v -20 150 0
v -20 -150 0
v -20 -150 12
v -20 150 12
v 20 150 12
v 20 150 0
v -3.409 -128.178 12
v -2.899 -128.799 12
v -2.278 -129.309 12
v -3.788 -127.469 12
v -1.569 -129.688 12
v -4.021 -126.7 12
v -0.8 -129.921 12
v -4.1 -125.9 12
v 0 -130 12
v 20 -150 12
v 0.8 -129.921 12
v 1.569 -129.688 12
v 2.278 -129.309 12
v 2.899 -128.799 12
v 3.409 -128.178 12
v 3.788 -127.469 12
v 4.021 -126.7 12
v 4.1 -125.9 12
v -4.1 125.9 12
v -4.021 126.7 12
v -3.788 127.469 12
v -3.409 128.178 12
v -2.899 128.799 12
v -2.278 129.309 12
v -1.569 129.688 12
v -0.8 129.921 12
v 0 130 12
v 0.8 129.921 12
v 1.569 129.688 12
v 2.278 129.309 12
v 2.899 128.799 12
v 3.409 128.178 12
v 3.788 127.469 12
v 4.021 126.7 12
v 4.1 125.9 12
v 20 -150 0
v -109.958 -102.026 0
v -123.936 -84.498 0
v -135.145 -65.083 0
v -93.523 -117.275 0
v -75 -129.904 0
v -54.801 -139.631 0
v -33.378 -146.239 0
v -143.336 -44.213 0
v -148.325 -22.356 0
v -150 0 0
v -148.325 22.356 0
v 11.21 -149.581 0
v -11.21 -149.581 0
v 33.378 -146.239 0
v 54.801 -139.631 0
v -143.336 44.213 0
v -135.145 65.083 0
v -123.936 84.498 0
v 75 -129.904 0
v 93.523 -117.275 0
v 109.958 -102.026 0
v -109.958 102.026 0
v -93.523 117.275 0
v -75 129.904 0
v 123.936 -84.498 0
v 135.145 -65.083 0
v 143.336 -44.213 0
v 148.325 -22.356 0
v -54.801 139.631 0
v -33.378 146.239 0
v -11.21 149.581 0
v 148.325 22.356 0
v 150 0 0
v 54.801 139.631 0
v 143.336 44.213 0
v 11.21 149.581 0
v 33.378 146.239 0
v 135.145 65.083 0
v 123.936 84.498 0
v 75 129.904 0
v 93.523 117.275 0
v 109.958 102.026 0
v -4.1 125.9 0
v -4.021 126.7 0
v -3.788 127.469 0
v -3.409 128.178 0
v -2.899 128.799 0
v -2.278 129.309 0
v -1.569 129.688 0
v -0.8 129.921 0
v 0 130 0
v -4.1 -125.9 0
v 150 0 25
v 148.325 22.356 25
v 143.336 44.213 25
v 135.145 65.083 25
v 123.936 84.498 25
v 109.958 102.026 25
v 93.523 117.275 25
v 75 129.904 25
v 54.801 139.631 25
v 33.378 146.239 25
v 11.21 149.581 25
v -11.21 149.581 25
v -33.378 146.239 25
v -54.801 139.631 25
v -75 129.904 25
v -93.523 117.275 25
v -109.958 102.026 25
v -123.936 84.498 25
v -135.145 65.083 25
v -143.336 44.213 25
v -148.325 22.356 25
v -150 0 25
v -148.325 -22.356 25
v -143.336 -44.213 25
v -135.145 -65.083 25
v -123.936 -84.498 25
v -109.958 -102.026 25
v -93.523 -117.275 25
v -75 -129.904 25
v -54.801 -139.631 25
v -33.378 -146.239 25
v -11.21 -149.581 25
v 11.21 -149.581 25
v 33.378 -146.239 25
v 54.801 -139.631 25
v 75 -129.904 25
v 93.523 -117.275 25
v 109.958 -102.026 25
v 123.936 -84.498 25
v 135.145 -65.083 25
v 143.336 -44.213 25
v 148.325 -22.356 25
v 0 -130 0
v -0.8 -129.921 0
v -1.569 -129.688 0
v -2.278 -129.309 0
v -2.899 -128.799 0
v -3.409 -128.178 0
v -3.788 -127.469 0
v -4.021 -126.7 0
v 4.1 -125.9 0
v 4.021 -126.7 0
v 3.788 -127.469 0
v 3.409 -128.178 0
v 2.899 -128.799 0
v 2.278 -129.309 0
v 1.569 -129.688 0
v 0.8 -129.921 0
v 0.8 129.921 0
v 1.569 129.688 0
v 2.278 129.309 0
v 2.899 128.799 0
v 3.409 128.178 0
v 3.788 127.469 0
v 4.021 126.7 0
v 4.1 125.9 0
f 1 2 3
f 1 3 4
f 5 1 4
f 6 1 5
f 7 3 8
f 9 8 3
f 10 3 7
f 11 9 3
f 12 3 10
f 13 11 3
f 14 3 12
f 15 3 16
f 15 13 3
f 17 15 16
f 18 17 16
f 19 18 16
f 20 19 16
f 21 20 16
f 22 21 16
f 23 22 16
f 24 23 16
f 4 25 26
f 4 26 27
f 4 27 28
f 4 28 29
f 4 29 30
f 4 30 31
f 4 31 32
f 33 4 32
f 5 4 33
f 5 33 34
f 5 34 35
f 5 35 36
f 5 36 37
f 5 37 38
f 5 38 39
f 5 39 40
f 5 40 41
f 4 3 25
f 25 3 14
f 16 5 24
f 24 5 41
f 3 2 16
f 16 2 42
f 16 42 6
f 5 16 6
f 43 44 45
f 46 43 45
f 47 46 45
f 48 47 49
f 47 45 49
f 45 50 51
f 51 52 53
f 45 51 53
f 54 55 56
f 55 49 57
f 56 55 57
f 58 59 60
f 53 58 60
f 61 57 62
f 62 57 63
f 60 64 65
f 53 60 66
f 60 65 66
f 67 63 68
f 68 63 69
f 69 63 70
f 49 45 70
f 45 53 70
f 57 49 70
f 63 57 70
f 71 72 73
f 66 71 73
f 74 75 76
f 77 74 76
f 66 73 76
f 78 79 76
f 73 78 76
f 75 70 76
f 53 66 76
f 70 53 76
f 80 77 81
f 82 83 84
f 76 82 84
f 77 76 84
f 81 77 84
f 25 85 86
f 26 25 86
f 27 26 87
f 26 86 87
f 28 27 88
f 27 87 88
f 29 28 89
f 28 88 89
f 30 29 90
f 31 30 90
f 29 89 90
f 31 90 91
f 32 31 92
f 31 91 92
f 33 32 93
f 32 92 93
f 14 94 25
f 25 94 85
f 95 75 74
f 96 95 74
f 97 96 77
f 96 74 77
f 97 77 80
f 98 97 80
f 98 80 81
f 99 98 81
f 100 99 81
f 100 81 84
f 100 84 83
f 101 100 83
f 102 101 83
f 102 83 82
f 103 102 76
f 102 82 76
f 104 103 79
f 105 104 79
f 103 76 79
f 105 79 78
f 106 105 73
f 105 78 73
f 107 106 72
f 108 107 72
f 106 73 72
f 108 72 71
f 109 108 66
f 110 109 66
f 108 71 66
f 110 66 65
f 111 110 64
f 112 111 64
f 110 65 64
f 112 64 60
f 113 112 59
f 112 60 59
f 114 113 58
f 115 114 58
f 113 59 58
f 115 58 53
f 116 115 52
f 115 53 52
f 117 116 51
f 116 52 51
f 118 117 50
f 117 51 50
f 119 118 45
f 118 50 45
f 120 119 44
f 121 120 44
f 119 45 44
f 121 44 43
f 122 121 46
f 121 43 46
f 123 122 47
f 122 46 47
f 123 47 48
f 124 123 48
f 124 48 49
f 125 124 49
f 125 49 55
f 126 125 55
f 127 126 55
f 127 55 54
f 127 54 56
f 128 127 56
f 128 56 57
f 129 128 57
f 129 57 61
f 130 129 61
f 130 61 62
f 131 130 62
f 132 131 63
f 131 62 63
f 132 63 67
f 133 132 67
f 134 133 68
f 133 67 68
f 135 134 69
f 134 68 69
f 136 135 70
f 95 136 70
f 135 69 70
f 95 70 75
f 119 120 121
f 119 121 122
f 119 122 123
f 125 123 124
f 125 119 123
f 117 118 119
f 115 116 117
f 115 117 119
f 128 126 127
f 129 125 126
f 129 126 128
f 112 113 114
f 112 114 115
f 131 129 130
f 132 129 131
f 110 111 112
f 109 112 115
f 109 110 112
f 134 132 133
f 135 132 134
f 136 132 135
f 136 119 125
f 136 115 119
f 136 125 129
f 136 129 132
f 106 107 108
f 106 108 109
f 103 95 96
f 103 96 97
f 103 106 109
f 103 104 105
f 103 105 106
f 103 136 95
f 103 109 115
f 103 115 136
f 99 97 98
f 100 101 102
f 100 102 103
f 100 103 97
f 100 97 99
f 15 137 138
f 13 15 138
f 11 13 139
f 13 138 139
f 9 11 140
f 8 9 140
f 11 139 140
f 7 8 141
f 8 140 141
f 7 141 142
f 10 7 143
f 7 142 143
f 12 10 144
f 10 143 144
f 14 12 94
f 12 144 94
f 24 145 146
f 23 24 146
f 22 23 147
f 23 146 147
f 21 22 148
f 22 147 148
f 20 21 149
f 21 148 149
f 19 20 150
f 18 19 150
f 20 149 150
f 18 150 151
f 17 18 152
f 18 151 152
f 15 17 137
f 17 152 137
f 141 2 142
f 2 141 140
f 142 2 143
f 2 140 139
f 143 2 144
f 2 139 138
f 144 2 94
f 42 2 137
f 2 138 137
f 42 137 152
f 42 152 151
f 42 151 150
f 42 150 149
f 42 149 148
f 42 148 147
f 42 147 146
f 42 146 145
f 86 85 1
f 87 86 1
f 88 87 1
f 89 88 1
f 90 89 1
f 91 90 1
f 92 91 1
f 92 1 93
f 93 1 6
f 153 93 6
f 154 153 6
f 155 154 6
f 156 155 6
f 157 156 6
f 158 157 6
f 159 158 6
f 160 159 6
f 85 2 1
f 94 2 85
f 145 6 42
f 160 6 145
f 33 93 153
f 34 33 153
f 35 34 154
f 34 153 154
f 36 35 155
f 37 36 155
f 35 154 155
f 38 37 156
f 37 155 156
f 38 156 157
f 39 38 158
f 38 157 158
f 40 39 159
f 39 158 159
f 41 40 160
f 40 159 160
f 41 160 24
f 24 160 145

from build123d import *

# Parameters (mm, degrees)
F0_W     = 40
F0_H     = 300
F1_DEPTH = 12
F2_R     = 150
F3_DEPTH = 25


with BuildPart() as f1:
    # F0 (on Top) → F1 (new body)
    with BuildSketch(Plane.XY):
        Rectangle(F0_W, F0_H)
        with BuildLine():
            Line((-4.1, -125.9), (-4.1, 125.9))
            ThreePointArc((-4.1, 125.9), (-2.899138, 128.799138), (0, 130))
            ThreePointArc((0, 130), (2.899138, 128.799138), (4.1, 125.9))
            Line((4.1, 125.9), (4.1, -125.9))
            ThreePointArc((4.1, -125.9), (2.899138, -128.799138), (0, -130))
            ThreePointArc((0, -130), (-2.899138, -128.799138), (-4.1, -125.9))
        make_face(mode=Mode.SUBTRACT)
    extrude(amount=F1_DEPTH)


with BuildPart() as f3:
    # F2 (on Top) → F3 (new body)
    with BuildSketch(Plane.XY):
        Circle(F2_R)
    extrude(amount=F3_DEPTH)


solid = Compound([f1.part, f3.part])
